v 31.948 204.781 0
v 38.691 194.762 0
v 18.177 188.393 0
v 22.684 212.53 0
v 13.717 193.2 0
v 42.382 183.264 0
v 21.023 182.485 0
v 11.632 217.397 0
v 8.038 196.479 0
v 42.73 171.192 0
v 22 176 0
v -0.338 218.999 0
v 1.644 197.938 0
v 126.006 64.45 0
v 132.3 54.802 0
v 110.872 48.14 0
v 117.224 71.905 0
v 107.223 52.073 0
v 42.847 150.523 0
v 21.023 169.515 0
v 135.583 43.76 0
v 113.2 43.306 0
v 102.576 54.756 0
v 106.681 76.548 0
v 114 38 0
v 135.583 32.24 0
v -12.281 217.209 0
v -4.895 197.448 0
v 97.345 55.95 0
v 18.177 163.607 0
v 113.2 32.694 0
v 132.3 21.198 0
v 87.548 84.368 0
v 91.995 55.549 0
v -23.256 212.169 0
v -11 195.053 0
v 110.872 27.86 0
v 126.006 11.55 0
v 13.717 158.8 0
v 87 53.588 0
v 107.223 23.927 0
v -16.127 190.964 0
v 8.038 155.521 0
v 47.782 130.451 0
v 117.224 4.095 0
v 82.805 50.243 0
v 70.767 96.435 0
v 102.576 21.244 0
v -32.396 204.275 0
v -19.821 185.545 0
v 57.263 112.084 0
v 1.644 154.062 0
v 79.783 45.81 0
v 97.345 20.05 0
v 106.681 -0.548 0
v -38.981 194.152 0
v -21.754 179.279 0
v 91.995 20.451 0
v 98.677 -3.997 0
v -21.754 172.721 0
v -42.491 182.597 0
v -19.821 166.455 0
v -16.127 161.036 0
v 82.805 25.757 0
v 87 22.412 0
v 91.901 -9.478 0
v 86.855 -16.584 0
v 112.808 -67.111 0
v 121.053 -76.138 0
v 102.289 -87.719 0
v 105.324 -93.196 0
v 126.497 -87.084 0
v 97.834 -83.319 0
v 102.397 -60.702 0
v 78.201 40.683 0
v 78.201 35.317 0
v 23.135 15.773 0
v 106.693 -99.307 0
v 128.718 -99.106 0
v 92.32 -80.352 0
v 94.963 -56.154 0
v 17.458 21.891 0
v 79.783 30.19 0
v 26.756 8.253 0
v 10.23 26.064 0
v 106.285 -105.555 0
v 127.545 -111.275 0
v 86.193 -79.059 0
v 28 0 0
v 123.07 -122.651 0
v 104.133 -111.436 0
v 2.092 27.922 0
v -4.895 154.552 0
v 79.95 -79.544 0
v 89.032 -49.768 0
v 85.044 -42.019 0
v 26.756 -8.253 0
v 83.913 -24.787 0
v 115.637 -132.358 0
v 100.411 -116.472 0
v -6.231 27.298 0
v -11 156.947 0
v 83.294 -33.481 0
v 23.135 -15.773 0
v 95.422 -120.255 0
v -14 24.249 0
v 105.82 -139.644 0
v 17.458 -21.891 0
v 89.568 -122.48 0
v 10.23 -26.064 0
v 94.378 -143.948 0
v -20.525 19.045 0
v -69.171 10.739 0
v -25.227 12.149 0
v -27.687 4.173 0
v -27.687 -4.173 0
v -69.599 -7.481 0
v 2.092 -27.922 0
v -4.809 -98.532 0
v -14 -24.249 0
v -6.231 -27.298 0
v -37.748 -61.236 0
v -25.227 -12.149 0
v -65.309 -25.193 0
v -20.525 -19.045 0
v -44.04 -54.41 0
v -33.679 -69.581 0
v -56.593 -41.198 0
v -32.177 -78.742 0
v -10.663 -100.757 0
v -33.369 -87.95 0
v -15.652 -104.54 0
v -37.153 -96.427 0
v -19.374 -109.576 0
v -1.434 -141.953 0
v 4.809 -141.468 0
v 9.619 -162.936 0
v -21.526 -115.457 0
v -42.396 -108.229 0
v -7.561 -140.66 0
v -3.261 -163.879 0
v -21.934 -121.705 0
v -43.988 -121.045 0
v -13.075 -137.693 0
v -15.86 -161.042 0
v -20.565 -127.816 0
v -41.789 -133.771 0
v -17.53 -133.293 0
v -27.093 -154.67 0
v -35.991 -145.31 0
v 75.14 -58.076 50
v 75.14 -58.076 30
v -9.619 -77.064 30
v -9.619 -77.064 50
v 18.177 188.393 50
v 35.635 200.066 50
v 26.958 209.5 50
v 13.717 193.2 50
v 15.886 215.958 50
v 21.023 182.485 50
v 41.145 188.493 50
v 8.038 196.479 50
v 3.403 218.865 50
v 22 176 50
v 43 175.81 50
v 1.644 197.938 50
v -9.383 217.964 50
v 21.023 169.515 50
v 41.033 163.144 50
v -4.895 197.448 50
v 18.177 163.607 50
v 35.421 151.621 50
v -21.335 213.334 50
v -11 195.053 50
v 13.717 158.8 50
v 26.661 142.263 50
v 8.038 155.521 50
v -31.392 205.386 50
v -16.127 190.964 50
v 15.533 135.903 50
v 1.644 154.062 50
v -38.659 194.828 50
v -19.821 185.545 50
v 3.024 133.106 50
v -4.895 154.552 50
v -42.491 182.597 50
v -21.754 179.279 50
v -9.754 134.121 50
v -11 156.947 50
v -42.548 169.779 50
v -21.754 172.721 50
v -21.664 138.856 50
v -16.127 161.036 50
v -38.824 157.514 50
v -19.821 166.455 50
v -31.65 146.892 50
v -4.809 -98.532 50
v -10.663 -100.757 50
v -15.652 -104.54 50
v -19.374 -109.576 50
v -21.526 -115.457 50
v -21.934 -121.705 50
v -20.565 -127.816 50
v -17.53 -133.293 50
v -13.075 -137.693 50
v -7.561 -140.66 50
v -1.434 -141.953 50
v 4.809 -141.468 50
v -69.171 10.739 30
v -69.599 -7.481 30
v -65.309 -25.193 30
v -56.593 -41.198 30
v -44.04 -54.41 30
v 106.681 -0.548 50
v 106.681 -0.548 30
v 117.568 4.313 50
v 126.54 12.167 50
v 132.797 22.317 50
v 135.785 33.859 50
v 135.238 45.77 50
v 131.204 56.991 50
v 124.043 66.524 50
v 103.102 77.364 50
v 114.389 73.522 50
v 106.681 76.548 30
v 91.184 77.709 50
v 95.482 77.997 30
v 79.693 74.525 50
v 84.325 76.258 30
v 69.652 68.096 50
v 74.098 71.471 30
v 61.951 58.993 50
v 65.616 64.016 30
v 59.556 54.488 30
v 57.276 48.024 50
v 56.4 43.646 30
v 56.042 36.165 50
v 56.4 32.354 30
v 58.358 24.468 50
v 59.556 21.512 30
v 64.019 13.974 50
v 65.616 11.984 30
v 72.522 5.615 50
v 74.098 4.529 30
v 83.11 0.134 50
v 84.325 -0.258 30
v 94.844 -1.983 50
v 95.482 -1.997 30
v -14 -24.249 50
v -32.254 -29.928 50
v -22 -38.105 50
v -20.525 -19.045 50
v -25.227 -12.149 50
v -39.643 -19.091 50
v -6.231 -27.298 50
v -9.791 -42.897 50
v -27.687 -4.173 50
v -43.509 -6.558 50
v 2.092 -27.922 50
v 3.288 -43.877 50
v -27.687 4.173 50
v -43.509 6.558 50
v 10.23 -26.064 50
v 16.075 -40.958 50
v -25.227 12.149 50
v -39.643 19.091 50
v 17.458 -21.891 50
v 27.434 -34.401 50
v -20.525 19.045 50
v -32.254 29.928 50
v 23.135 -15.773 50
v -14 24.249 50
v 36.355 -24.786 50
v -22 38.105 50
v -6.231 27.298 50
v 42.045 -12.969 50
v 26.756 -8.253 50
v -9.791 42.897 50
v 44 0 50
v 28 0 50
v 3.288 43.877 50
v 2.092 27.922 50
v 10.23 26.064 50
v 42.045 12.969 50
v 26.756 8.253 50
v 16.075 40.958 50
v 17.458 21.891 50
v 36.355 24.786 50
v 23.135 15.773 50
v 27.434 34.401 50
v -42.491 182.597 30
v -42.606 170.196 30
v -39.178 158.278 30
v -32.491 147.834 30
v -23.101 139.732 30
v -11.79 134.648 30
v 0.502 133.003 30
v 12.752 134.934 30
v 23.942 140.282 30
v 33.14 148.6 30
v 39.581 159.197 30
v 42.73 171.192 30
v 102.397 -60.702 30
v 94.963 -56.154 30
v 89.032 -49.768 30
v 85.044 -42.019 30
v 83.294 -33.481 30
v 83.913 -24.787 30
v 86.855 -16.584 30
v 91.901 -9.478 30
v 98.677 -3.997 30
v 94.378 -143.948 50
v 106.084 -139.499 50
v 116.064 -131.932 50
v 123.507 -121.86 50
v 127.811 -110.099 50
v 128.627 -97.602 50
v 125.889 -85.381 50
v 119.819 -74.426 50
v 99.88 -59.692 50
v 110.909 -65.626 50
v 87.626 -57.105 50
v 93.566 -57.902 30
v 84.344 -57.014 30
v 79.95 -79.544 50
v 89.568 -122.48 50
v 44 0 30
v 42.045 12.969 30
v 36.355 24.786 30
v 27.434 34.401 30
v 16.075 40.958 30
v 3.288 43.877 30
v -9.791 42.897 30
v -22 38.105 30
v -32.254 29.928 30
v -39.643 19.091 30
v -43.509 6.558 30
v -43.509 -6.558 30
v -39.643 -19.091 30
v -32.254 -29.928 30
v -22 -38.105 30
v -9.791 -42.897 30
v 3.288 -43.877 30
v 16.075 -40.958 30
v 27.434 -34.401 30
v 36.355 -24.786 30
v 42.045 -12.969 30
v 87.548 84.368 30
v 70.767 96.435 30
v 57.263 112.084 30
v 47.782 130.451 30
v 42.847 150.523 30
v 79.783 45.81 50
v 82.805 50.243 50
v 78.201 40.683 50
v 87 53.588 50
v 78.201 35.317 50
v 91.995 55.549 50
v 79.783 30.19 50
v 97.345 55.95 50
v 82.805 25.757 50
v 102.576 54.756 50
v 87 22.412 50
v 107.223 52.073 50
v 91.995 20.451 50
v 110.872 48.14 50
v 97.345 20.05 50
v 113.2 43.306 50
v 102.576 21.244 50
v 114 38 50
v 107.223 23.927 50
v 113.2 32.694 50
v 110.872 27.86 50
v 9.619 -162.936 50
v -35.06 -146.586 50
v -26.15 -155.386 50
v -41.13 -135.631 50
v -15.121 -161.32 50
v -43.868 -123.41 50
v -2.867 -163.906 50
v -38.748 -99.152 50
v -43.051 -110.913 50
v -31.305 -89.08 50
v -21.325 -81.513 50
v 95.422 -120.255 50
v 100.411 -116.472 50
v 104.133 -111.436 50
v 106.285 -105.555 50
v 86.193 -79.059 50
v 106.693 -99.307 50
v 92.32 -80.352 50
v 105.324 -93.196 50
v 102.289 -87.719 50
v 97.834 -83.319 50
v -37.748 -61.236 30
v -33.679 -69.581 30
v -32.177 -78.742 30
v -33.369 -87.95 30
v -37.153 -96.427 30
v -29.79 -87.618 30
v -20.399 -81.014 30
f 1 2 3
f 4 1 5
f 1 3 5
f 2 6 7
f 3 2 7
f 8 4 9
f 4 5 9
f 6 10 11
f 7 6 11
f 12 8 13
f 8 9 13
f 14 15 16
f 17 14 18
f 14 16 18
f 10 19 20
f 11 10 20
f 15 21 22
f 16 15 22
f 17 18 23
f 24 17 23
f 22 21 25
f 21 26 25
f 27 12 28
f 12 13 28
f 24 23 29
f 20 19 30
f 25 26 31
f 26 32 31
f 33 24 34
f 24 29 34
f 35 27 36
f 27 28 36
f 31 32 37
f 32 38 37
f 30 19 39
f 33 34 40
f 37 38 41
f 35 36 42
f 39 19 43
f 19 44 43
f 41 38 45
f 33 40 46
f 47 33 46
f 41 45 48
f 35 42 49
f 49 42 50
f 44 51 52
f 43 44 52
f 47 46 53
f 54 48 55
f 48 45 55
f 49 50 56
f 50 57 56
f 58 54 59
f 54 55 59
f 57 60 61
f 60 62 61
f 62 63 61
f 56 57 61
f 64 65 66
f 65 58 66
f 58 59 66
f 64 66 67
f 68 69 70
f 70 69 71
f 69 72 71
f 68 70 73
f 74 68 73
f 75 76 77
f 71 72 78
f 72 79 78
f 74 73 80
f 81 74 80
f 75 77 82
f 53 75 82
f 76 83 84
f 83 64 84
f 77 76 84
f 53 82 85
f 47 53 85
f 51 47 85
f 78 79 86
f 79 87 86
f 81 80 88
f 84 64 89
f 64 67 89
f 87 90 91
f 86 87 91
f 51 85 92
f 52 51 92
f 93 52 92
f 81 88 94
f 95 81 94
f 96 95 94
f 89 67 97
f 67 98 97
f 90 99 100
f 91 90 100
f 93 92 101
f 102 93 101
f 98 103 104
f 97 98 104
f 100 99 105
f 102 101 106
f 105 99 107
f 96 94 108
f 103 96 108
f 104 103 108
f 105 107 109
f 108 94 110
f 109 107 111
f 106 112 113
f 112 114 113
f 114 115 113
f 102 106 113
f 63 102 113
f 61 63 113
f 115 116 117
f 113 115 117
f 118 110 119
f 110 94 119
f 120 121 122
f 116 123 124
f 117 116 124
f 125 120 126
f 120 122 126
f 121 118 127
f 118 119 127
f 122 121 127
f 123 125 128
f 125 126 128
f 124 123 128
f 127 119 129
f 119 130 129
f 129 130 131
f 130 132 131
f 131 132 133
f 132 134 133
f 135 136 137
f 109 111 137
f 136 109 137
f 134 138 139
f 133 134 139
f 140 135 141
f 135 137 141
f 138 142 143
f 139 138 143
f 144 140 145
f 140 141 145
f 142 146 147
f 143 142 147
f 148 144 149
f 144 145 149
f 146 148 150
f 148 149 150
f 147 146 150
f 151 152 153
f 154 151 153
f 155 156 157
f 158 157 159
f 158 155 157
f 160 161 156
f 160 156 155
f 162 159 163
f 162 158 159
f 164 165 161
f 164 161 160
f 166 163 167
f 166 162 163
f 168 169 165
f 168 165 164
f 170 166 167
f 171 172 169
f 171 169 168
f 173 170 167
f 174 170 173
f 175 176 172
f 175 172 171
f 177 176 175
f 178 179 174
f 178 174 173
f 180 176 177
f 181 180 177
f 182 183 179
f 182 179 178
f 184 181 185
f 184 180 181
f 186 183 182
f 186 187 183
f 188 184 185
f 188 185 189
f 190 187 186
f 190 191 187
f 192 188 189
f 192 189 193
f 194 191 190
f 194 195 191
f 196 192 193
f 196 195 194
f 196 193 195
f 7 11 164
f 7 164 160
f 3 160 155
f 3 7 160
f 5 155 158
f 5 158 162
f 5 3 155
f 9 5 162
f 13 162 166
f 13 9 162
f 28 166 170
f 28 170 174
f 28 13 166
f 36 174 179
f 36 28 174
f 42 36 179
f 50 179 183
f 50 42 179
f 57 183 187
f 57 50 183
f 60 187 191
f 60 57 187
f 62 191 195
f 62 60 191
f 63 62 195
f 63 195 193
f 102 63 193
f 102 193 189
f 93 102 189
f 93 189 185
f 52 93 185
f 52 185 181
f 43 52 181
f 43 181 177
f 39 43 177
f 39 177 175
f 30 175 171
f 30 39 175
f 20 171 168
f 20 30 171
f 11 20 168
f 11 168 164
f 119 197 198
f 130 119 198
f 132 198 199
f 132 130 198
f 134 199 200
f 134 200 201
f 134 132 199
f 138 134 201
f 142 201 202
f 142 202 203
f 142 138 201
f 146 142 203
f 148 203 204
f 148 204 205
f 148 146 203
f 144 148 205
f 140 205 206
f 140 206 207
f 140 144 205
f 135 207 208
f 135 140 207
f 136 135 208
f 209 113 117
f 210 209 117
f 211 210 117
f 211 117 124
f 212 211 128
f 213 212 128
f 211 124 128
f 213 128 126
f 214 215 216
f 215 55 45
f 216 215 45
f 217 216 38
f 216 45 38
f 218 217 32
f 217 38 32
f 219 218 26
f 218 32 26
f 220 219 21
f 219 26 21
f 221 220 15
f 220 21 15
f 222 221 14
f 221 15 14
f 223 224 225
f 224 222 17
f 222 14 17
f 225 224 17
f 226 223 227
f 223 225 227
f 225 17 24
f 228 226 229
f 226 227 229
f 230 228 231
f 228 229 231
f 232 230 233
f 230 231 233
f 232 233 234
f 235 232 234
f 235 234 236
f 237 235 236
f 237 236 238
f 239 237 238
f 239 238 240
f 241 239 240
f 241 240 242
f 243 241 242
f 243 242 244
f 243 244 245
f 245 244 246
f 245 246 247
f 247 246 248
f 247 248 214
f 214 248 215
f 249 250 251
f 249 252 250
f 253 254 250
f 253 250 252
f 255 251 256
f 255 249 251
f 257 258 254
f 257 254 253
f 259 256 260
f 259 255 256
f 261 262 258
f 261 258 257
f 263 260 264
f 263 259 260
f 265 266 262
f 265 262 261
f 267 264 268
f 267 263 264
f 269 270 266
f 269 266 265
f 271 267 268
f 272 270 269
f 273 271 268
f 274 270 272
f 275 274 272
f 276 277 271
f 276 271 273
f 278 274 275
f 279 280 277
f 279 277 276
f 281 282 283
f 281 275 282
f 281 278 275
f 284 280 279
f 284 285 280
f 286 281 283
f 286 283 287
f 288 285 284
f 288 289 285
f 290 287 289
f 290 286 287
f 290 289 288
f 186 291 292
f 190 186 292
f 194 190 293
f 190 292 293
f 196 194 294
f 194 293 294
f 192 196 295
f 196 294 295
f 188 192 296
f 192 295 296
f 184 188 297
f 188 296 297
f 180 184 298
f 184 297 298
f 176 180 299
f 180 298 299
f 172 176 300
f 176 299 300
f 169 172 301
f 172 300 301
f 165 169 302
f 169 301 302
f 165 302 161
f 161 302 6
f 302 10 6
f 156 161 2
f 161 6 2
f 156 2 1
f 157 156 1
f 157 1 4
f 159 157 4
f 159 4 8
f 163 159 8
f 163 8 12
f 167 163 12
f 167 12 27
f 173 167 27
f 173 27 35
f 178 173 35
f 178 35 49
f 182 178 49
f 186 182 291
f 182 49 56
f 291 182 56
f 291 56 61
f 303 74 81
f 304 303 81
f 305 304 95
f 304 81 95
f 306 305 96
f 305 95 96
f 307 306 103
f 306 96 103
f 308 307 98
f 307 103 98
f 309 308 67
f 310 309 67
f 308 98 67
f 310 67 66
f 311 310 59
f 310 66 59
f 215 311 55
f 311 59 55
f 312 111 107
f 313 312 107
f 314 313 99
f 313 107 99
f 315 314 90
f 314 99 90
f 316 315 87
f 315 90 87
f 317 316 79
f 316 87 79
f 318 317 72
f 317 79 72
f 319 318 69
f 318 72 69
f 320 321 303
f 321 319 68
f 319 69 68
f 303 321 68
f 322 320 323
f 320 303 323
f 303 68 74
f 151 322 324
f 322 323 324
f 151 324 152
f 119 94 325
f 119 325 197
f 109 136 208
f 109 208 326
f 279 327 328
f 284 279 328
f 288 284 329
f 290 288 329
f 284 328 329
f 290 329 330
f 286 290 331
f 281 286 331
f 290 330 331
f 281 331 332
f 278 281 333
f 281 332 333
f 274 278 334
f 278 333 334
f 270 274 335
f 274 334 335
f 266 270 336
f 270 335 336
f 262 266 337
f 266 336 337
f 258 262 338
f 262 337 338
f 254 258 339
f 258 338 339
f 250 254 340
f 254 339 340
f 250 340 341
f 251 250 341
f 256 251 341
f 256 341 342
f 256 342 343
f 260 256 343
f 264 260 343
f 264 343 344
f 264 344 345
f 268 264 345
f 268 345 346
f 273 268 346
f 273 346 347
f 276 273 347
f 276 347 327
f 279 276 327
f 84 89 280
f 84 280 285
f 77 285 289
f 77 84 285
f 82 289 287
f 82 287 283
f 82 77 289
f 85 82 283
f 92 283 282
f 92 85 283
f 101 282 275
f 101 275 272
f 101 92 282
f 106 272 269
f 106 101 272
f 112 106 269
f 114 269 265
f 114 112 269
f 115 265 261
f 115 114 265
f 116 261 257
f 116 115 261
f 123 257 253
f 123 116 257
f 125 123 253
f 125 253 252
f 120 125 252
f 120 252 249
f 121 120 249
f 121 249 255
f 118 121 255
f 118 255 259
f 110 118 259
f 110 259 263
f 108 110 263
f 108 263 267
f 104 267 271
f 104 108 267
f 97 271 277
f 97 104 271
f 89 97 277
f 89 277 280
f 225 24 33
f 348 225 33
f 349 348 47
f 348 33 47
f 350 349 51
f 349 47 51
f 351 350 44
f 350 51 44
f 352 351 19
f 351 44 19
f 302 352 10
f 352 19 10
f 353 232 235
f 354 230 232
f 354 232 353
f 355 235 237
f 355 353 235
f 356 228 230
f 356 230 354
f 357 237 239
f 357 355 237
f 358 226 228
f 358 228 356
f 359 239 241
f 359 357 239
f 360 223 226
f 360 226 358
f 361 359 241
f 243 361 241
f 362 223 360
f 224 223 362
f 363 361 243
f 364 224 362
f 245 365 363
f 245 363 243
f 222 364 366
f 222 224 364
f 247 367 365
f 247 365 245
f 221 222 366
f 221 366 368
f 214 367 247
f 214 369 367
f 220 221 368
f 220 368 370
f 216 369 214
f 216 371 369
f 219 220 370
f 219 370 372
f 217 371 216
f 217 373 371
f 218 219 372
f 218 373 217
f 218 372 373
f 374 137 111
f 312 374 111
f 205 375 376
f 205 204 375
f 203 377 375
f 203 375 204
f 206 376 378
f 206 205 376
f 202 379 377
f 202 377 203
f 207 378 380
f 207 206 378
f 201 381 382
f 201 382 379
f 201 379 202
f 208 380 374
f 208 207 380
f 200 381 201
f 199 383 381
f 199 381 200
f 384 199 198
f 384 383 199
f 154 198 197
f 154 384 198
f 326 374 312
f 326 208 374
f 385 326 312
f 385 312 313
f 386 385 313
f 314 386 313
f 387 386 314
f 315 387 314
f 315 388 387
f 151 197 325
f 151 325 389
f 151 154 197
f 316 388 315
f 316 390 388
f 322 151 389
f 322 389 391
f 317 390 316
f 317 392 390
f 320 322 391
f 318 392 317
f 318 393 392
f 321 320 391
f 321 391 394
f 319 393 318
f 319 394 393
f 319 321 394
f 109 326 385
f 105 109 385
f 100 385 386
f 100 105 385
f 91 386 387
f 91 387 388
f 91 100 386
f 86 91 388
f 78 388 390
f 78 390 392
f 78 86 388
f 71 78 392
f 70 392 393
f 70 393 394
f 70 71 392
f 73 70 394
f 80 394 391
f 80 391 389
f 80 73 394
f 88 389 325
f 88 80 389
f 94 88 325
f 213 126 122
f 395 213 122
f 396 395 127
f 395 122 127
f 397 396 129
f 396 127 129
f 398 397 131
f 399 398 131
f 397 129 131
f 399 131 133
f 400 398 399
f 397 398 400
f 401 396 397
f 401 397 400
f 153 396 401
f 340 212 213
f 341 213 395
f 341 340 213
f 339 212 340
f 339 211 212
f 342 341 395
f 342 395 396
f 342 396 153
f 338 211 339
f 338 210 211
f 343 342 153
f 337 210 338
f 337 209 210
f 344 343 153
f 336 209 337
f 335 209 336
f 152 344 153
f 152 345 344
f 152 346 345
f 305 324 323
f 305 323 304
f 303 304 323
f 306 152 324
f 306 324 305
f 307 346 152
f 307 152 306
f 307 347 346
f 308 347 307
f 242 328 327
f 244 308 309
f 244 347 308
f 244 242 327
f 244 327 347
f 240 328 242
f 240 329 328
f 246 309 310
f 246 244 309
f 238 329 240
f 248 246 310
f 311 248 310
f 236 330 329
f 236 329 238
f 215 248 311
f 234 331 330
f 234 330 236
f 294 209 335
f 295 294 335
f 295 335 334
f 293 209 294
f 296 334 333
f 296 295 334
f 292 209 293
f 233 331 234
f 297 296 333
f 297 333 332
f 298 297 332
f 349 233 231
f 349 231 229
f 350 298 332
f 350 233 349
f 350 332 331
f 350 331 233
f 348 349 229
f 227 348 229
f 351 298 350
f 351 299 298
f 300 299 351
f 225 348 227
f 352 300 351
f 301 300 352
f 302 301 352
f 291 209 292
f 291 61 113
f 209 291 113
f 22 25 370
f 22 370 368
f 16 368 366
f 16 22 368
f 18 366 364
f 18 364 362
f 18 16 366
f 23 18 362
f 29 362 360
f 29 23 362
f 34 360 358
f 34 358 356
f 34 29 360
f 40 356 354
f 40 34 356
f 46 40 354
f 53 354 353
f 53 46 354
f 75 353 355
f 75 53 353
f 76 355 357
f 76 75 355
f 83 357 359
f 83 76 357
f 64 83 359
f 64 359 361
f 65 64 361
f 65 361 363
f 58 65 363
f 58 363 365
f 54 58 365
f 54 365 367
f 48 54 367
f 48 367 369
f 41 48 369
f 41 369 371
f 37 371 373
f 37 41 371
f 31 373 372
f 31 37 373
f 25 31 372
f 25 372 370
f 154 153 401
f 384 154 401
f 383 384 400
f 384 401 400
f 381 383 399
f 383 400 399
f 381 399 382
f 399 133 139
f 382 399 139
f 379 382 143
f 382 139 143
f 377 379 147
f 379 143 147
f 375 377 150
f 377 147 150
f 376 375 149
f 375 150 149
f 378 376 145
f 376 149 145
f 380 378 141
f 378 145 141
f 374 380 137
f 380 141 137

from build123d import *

# Parameters (mm, degrees)
SKETCH1_R           = 44
BOSS_EXTRUDE1_DEPTH = 30
SKETCH1_3_R         = 40
SKETCH1_3_R_2       = 18
SKETCH1_3_R_3       = 43
SKETCH1_3_R_4       = 22
SKETCH1_3_R_5       = 44
SKETCH1_3_R_6       = 28
BOSS_EXTRUDE2_DEPTH = 50


with BuildPart() as part:
    # Sketch1 → Boss-Extrude1 (new body)
    with BuildSketch(Plane.XY):
        with BuildLine():
            ThreePointArc((-37.152695317, -96.427192982), (-25.310496196, -84.008629057), (-9.618664602, -77.064218986))
            Line((-9.618664602, -77.064218986), (75.140384229, -58.076119936))
            ThreePointArc((75.140384229, -58.076119936), (88.978408325, -57.214674948), (102.397475744, -60.702027518))
            ThreePointArc((102.397475744, -60.702027518), (83.306238653, -29.112938991), (106.680790328, -0.547642184))
            ThreePointArc((106.680790328, -0.547642184), (56, 38), (106.680790328, 76.547642184))
            ThreePointArc((106.680790328, 76.547642184), (57.263244705, 112.084196354), (42.730356863, 171.192027211))
            ThreePointArc((42.730356863, 171.192027211), (-5.703537617, 133.379938308), (-42.49099891, 182.596590909))
            Line((-42.49099891, 182.596590909), (-69.171393575, 10.738636364))
            ThreePointArc((-69.171393575, 10.738636364), (-65.309307933, -25.193139885), (-44.040182506, -54.410130719))
            ThreePointArc((-44.040182506, -54.410130719), (-32.594285398, -74.106939259), (-37.152695317, -96.427192982))
        make_face()
        Circle(SKETCH1_R, mode=Mode.SUBTRACT)
    extrude(amount=BOSS_EXTRUDE1_DEPTH)

    # Sketch1<3> → Boss-Extrude2 (add)
    # profile 1 of 4: a face of its own
    with BuildSketch(Plane.XY):
        with BuildLine():
            Line((75.140384229, -58.076119936), (-9.618664602, -77.064218986))
            ThreePointArc((-9.618664602, -77.064218986), (-42.935781014, -129.618664602), (9.618664602, -162.935781014))
            Line((9.618664602, -162.935781014), (94.377713433, -143.947681963))
            ThreePointArc((94.377713433, -143.947681963), (127.694829845, -91.393236347), (75.140384229, -58.076119936))
        make_face()
        with BuildLine():
            ThreePointArc((4.809332301, -141.467890507), (-21.467890507, -124.809332301), (-4.809332301, -98.532109493))
            Line((-4.809332301, -98.532109493), (79.94971653, -79.544010443))
            ThreePointArc((79.94971653, -79.544010443), (106.226939338, -96.202568649), (89.568381132, -122.479791457))
            Line((89.568381132, -122.479791457), (4.809332301, -141.467890507))
        make_face(mode=Mode.SUBTRACT)
    # profile 2 of 4: a face of its own
    with BuildSketch(Plane.XY):
        with Locations((96, 38)):
            Circle(SKETCH1_3_R)
        with Locations((96, 38)):
            Circle(SKETCH1_3_R_2, mode=Mode.SUBTRACT)
    # profile 3 of 4: a face of its own
    with BuildSketch(Plane.XY):
        with Locations((0, 176)):
            Circle(SKETCH1_3_R_3)
        with Locations((0, 176)):
            Circle(SKETCH1_3_R_4, mode=Mode.SUBTRACT)
    # profile 4 of 4: a face of its own
    with BuildSketch(Plane.XY):
        Circle(SKETCH1_3_R_5)
        Circle(SKETCH1_3_R_6, mode=Mode.SUBTRACT)
    extrude(amount=BOSS_EXTRUDE2_DEPTH)


solid = part.part
